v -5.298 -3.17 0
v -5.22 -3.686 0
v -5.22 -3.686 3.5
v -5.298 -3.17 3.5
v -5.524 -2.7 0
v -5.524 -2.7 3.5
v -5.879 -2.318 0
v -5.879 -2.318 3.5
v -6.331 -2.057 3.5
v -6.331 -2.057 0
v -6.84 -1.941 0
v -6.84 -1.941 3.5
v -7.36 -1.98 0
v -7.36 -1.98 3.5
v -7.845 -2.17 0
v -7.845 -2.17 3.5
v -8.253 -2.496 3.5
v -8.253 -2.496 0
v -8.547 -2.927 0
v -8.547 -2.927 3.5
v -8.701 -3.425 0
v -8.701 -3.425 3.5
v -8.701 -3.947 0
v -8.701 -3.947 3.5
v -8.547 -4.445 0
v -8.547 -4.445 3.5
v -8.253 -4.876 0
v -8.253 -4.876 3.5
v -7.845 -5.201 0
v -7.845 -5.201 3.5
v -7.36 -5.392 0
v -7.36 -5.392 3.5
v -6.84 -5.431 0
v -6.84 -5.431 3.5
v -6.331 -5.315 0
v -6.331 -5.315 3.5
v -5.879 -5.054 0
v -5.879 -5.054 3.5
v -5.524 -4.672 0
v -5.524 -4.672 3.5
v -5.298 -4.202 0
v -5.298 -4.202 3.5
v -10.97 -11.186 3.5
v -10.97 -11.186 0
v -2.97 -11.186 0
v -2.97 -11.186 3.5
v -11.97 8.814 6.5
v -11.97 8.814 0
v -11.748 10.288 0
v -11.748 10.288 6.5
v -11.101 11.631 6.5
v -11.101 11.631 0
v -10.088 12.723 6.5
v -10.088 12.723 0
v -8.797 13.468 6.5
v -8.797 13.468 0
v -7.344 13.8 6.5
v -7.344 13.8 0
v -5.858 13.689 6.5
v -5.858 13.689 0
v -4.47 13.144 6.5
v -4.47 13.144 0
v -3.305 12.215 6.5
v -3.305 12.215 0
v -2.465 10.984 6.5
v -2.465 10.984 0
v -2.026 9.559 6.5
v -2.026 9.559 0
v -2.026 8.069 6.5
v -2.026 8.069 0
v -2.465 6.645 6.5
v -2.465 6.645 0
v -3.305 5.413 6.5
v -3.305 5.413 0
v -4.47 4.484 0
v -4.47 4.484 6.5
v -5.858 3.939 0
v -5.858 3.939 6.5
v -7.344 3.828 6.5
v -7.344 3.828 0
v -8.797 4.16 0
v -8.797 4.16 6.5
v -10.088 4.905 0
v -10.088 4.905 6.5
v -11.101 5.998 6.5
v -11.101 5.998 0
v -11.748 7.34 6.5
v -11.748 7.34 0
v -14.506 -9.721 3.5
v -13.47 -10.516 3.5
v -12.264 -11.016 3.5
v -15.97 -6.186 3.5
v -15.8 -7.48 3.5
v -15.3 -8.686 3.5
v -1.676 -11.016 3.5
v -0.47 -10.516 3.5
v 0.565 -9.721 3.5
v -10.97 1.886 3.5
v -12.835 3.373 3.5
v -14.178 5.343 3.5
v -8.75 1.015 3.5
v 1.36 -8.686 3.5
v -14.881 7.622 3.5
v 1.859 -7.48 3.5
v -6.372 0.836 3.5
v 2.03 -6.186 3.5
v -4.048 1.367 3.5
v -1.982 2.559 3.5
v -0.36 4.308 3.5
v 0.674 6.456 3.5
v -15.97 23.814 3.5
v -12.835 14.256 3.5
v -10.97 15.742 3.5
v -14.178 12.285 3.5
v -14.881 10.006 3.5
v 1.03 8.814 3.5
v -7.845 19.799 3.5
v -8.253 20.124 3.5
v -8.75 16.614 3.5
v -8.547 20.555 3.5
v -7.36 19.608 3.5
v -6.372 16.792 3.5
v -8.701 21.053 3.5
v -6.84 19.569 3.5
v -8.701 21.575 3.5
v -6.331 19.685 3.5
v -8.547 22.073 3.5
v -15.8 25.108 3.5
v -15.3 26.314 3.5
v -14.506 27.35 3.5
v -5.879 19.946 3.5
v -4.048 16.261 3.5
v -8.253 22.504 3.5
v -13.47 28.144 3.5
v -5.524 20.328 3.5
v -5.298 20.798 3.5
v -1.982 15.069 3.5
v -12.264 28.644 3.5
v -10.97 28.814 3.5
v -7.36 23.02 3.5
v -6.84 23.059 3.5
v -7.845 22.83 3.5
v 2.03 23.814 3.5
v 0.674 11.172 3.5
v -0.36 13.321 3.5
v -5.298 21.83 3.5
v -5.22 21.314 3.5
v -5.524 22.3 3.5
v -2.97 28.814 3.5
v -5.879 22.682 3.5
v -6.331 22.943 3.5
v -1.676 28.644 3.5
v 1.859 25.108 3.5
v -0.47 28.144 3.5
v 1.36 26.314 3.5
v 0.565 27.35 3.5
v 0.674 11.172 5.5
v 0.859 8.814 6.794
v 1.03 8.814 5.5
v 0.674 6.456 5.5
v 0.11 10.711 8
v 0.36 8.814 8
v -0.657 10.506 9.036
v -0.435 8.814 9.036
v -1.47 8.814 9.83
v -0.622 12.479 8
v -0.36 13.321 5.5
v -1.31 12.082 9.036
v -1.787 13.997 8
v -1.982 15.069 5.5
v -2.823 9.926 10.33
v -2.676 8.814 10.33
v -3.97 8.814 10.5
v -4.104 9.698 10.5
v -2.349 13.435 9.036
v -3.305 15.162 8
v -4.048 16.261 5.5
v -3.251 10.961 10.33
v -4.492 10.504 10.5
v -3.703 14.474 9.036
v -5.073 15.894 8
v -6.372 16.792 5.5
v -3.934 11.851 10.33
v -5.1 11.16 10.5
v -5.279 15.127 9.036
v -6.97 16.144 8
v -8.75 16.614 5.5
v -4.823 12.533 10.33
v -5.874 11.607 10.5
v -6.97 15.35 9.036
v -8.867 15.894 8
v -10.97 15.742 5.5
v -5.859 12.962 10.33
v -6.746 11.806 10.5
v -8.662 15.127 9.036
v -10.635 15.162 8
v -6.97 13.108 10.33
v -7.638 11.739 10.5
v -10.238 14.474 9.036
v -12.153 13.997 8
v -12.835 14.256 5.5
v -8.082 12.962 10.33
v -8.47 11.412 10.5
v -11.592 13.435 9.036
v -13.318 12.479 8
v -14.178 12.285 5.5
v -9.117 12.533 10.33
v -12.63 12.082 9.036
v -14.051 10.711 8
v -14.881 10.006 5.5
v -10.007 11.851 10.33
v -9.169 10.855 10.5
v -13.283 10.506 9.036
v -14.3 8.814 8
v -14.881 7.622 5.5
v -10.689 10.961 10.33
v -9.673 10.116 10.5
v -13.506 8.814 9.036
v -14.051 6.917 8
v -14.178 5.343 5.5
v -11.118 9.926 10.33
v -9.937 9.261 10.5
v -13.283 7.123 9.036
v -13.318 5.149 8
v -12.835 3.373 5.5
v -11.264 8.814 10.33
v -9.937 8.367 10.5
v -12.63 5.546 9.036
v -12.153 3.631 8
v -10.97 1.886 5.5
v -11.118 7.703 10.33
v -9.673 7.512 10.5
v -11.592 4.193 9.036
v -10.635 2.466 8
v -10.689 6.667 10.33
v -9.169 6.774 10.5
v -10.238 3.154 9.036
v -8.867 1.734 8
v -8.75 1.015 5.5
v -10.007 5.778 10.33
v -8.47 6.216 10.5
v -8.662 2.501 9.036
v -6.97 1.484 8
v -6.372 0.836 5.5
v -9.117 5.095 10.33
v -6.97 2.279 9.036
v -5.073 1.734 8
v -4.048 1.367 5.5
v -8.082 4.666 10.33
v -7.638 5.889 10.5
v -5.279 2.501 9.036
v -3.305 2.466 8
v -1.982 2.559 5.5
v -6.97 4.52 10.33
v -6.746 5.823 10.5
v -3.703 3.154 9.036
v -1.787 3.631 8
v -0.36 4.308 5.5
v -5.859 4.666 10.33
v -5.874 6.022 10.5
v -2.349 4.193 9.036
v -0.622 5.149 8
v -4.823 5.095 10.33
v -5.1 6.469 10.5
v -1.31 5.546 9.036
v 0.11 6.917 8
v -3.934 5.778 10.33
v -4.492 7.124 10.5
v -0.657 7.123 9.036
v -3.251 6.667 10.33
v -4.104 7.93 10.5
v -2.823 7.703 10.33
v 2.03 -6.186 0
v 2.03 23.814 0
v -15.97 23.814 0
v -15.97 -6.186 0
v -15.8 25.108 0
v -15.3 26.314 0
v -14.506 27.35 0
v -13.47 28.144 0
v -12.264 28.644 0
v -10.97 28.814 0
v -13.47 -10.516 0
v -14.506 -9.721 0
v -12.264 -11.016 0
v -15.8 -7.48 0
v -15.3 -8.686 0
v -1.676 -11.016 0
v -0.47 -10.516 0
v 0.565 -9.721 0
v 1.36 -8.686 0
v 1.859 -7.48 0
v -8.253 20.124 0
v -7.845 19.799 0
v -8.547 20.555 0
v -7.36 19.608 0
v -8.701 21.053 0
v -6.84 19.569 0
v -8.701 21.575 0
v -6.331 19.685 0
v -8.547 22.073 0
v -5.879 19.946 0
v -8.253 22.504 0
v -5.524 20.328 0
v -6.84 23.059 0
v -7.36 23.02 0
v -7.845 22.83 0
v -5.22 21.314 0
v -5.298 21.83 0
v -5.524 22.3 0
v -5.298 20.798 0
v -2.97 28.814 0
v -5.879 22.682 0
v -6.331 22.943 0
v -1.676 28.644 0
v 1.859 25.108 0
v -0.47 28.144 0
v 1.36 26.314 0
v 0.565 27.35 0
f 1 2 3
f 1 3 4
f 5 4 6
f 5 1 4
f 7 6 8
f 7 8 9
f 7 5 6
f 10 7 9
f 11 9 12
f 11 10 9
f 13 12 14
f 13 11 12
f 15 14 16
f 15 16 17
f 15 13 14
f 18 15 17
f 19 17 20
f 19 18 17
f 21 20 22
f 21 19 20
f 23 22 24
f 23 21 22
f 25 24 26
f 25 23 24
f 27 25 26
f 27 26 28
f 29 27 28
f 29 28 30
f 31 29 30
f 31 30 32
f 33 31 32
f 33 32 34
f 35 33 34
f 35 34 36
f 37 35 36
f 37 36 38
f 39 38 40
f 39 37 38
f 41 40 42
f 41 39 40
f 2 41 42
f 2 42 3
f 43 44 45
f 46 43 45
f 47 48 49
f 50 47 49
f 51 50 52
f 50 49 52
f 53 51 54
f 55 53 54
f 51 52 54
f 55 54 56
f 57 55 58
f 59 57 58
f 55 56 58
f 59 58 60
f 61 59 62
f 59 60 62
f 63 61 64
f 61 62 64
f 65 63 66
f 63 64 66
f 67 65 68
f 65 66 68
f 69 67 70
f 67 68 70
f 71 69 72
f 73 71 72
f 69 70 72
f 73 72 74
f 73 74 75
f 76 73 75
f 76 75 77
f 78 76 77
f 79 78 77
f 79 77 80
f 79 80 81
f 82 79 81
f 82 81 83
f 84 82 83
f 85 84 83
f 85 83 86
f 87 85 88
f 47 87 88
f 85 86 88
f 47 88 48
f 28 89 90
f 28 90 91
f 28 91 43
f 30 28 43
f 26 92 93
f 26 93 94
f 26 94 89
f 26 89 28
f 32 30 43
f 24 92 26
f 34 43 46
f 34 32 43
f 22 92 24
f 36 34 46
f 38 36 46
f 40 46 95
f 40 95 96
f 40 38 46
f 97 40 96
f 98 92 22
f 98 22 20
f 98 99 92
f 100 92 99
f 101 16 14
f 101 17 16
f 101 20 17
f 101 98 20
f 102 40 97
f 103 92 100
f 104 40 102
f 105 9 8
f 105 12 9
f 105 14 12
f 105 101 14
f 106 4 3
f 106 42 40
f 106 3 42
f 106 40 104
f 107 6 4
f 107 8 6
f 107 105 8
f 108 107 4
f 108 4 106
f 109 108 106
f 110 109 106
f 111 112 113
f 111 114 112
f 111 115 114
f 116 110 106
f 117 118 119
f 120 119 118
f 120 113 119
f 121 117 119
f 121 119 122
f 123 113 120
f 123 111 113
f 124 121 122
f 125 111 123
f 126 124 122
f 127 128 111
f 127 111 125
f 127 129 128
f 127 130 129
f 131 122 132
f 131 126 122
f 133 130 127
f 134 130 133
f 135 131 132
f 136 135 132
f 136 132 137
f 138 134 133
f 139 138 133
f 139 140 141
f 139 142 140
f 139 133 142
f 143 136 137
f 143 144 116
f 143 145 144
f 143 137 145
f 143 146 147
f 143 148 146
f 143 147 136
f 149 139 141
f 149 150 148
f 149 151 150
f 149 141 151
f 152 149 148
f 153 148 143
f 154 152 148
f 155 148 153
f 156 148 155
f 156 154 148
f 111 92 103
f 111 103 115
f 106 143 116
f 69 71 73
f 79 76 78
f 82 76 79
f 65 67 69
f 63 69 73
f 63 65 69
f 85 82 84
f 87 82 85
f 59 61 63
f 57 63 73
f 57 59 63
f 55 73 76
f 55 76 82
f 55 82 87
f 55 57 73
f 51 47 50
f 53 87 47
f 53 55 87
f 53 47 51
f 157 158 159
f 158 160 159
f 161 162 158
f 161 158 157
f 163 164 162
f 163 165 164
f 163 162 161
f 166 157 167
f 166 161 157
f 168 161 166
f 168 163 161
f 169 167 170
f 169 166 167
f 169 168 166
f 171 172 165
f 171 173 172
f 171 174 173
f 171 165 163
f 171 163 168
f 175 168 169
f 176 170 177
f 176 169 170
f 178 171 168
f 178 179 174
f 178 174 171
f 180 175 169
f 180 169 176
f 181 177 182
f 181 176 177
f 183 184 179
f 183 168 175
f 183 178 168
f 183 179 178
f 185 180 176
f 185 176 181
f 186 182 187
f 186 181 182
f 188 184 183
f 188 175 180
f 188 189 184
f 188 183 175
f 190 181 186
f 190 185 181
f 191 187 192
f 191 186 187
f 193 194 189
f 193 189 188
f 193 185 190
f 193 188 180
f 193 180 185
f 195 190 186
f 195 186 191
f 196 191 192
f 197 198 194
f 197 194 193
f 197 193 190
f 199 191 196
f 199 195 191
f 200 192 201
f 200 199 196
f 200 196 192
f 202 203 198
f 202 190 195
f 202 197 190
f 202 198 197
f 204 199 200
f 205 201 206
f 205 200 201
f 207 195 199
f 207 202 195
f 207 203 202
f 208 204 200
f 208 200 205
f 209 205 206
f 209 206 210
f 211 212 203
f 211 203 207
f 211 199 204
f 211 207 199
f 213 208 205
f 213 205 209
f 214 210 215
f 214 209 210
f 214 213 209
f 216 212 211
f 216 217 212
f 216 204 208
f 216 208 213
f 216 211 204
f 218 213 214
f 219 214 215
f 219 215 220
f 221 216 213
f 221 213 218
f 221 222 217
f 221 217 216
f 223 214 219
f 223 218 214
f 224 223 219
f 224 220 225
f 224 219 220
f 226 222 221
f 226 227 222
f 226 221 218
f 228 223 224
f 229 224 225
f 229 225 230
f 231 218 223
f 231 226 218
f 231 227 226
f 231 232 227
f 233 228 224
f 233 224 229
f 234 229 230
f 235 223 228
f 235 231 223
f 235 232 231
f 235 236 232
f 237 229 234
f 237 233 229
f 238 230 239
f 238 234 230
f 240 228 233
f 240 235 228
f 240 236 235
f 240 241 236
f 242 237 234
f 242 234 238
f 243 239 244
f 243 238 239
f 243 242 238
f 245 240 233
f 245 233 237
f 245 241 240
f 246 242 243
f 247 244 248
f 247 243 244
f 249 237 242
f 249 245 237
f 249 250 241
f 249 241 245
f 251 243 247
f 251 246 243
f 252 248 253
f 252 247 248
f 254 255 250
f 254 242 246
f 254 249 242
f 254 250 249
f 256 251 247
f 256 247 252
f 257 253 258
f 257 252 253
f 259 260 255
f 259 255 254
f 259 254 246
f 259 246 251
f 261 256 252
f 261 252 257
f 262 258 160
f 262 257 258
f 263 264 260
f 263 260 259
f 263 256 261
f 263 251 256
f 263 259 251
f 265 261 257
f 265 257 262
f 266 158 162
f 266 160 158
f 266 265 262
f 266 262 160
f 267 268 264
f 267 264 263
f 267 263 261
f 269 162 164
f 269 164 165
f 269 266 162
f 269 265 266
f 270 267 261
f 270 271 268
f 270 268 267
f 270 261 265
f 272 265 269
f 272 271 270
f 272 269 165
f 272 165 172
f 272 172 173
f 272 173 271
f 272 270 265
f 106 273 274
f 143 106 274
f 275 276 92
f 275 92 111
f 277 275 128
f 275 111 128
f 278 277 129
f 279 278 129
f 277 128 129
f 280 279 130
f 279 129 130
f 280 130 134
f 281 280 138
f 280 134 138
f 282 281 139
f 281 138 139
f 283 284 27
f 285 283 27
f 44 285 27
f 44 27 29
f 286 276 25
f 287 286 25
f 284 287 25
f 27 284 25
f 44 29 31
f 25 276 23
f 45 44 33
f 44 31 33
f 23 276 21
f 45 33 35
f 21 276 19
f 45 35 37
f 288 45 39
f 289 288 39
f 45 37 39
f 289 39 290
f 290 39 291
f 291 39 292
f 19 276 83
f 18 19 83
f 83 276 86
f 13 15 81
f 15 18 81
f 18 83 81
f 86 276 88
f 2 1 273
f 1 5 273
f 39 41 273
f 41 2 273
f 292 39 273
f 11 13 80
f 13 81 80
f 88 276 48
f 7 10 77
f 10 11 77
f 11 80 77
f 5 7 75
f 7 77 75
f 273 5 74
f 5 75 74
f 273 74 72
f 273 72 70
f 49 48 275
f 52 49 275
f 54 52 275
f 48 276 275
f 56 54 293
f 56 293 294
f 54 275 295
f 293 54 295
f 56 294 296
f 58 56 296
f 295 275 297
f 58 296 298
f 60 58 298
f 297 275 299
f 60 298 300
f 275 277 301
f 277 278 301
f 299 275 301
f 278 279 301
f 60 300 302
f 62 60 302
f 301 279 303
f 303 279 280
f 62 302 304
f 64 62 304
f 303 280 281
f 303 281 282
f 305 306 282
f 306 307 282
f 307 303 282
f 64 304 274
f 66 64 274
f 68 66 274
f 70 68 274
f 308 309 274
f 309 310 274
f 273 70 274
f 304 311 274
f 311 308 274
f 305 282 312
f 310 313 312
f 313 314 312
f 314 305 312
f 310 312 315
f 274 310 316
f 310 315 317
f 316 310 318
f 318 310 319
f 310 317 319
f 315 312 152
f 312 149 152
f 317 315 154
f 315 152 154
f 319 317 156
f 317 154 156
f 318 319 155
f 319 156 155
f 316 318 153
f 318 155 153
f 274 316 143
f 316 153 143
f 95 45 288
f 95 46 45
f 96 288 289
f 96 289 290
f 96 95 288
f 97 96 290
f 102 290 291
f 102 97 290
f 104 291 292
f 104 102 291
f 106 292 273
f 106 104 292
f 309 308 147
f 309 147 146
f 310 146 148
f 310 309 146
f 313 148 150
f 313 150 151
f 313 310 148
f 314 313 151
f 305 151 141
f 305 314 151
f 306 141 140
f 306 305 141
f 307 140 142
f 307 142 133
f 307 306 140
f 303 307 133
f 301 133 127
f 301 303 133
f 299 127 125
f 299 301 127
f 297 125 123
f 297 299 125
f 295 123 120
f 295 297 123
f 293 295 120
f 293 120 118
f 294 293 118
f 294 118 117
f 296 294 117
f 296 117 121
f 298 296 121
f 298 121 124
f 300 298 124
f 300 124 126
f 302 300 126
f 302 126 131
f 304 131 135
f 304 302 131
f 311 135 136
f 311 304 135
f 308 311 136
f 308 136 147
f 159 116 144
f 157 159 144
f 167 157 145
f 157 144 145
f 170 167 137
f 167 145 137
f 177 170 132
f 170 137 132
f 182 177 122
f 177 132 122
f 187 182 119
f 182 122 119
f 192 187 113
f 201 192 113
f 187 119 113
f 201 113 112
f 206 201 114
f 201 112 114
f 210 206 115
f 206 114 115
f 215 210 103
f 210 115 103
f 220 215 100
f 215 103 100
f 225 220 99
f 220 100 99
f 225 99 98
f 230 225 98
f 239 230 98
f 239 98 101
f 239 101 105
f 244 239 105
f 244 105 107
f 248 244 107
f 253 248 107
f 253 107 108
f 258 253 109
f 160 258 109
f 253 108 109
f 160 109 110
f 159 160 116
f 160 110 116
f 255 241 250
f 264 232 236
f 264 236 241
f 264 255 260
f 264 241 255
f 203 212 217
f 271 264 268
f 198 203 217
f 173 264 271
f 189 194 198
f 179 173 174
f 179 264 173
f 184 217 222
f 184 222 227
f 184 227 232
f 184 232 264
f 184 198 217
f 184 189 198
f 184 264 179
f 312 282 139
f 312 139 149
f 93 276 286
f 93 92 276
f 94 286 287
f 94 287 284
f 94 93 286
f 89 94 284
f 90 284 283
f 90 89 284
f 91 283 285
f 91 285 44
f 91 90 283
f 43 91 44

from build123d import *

# Parameters (mm, degrees)
SKETCH1_W           = 18
SKETCH1_H           = 40
SKETCH1_R           = 1.75
BOSS_EXTRUDE1_DEPTH = 3.5
SKETCH2_R           = 8
BOSS_EXTRUDE2_DEPTH = 7
SKETCH3_R           = 5
CUT_EXTRUDE1_DEPTH  = 6.5
FILLET1_R           = 5


with BuildPart() as part:
    # Sketch1 → Boss-Extrude1 (new body)
    with BuildSketch(Plane.XY):
        with Locations((-6.970291657, 8.814124101)):
            Rectangle(SKETCH1_W, SKETCH1_H)
        with Locations((-6.970291657, 21.314124101)):
            Circle(SKETCH1_R, mode=Mode.SUBTRACT)
        with Locations((-6.970291657, -3.685875899)):
            Circle(SKETCH1_R, mode=Mode.SUBTRACT)
    extrude(amount=BOSS_EXTRUDE1_DEPTH)

    # Sketch2 → Boss-Extrude2 (add)
    with BuildSketch(Plane.XY.offset(3.5)):
        with Locations((-6.970291657, 8.814124101)):
            Circle(SKETCH2_R)
    extrude(amount=BOSS_EXTRUDE2_DEPTH)

    # Sketch3 → Cut-Extrude1 (cut)
    with BuildSketch(Plane(origin=(0, 0, 0), x_dir=(-1, 0, 0), z_dir=(0, 0, -1))):
        with Locations((6.970291657, 8.814124101)):
            Circle(SKETCH3_R)
    extrude(amount=-CUT_EXTRUDE1_DEPTH, mode=Mode.SUBTRACT)

    # Fillet1
    fillet1_edges = [part.edges().sort_by_distance(p)[0] for p in [
        (-14.970291657, 8.814124101, 10.5),
        (-15.970291657, 28.814124101, 1.75),
        (2.029708343, 28.814124101, 1.75),
        (2.029708343, -11.185875899, 1.75),
        (-15.970291657, -11.185875899, 1.75),
    ]]
    fillet(fillet1_edges, radius=FILLET1_R)


solid = part.part
